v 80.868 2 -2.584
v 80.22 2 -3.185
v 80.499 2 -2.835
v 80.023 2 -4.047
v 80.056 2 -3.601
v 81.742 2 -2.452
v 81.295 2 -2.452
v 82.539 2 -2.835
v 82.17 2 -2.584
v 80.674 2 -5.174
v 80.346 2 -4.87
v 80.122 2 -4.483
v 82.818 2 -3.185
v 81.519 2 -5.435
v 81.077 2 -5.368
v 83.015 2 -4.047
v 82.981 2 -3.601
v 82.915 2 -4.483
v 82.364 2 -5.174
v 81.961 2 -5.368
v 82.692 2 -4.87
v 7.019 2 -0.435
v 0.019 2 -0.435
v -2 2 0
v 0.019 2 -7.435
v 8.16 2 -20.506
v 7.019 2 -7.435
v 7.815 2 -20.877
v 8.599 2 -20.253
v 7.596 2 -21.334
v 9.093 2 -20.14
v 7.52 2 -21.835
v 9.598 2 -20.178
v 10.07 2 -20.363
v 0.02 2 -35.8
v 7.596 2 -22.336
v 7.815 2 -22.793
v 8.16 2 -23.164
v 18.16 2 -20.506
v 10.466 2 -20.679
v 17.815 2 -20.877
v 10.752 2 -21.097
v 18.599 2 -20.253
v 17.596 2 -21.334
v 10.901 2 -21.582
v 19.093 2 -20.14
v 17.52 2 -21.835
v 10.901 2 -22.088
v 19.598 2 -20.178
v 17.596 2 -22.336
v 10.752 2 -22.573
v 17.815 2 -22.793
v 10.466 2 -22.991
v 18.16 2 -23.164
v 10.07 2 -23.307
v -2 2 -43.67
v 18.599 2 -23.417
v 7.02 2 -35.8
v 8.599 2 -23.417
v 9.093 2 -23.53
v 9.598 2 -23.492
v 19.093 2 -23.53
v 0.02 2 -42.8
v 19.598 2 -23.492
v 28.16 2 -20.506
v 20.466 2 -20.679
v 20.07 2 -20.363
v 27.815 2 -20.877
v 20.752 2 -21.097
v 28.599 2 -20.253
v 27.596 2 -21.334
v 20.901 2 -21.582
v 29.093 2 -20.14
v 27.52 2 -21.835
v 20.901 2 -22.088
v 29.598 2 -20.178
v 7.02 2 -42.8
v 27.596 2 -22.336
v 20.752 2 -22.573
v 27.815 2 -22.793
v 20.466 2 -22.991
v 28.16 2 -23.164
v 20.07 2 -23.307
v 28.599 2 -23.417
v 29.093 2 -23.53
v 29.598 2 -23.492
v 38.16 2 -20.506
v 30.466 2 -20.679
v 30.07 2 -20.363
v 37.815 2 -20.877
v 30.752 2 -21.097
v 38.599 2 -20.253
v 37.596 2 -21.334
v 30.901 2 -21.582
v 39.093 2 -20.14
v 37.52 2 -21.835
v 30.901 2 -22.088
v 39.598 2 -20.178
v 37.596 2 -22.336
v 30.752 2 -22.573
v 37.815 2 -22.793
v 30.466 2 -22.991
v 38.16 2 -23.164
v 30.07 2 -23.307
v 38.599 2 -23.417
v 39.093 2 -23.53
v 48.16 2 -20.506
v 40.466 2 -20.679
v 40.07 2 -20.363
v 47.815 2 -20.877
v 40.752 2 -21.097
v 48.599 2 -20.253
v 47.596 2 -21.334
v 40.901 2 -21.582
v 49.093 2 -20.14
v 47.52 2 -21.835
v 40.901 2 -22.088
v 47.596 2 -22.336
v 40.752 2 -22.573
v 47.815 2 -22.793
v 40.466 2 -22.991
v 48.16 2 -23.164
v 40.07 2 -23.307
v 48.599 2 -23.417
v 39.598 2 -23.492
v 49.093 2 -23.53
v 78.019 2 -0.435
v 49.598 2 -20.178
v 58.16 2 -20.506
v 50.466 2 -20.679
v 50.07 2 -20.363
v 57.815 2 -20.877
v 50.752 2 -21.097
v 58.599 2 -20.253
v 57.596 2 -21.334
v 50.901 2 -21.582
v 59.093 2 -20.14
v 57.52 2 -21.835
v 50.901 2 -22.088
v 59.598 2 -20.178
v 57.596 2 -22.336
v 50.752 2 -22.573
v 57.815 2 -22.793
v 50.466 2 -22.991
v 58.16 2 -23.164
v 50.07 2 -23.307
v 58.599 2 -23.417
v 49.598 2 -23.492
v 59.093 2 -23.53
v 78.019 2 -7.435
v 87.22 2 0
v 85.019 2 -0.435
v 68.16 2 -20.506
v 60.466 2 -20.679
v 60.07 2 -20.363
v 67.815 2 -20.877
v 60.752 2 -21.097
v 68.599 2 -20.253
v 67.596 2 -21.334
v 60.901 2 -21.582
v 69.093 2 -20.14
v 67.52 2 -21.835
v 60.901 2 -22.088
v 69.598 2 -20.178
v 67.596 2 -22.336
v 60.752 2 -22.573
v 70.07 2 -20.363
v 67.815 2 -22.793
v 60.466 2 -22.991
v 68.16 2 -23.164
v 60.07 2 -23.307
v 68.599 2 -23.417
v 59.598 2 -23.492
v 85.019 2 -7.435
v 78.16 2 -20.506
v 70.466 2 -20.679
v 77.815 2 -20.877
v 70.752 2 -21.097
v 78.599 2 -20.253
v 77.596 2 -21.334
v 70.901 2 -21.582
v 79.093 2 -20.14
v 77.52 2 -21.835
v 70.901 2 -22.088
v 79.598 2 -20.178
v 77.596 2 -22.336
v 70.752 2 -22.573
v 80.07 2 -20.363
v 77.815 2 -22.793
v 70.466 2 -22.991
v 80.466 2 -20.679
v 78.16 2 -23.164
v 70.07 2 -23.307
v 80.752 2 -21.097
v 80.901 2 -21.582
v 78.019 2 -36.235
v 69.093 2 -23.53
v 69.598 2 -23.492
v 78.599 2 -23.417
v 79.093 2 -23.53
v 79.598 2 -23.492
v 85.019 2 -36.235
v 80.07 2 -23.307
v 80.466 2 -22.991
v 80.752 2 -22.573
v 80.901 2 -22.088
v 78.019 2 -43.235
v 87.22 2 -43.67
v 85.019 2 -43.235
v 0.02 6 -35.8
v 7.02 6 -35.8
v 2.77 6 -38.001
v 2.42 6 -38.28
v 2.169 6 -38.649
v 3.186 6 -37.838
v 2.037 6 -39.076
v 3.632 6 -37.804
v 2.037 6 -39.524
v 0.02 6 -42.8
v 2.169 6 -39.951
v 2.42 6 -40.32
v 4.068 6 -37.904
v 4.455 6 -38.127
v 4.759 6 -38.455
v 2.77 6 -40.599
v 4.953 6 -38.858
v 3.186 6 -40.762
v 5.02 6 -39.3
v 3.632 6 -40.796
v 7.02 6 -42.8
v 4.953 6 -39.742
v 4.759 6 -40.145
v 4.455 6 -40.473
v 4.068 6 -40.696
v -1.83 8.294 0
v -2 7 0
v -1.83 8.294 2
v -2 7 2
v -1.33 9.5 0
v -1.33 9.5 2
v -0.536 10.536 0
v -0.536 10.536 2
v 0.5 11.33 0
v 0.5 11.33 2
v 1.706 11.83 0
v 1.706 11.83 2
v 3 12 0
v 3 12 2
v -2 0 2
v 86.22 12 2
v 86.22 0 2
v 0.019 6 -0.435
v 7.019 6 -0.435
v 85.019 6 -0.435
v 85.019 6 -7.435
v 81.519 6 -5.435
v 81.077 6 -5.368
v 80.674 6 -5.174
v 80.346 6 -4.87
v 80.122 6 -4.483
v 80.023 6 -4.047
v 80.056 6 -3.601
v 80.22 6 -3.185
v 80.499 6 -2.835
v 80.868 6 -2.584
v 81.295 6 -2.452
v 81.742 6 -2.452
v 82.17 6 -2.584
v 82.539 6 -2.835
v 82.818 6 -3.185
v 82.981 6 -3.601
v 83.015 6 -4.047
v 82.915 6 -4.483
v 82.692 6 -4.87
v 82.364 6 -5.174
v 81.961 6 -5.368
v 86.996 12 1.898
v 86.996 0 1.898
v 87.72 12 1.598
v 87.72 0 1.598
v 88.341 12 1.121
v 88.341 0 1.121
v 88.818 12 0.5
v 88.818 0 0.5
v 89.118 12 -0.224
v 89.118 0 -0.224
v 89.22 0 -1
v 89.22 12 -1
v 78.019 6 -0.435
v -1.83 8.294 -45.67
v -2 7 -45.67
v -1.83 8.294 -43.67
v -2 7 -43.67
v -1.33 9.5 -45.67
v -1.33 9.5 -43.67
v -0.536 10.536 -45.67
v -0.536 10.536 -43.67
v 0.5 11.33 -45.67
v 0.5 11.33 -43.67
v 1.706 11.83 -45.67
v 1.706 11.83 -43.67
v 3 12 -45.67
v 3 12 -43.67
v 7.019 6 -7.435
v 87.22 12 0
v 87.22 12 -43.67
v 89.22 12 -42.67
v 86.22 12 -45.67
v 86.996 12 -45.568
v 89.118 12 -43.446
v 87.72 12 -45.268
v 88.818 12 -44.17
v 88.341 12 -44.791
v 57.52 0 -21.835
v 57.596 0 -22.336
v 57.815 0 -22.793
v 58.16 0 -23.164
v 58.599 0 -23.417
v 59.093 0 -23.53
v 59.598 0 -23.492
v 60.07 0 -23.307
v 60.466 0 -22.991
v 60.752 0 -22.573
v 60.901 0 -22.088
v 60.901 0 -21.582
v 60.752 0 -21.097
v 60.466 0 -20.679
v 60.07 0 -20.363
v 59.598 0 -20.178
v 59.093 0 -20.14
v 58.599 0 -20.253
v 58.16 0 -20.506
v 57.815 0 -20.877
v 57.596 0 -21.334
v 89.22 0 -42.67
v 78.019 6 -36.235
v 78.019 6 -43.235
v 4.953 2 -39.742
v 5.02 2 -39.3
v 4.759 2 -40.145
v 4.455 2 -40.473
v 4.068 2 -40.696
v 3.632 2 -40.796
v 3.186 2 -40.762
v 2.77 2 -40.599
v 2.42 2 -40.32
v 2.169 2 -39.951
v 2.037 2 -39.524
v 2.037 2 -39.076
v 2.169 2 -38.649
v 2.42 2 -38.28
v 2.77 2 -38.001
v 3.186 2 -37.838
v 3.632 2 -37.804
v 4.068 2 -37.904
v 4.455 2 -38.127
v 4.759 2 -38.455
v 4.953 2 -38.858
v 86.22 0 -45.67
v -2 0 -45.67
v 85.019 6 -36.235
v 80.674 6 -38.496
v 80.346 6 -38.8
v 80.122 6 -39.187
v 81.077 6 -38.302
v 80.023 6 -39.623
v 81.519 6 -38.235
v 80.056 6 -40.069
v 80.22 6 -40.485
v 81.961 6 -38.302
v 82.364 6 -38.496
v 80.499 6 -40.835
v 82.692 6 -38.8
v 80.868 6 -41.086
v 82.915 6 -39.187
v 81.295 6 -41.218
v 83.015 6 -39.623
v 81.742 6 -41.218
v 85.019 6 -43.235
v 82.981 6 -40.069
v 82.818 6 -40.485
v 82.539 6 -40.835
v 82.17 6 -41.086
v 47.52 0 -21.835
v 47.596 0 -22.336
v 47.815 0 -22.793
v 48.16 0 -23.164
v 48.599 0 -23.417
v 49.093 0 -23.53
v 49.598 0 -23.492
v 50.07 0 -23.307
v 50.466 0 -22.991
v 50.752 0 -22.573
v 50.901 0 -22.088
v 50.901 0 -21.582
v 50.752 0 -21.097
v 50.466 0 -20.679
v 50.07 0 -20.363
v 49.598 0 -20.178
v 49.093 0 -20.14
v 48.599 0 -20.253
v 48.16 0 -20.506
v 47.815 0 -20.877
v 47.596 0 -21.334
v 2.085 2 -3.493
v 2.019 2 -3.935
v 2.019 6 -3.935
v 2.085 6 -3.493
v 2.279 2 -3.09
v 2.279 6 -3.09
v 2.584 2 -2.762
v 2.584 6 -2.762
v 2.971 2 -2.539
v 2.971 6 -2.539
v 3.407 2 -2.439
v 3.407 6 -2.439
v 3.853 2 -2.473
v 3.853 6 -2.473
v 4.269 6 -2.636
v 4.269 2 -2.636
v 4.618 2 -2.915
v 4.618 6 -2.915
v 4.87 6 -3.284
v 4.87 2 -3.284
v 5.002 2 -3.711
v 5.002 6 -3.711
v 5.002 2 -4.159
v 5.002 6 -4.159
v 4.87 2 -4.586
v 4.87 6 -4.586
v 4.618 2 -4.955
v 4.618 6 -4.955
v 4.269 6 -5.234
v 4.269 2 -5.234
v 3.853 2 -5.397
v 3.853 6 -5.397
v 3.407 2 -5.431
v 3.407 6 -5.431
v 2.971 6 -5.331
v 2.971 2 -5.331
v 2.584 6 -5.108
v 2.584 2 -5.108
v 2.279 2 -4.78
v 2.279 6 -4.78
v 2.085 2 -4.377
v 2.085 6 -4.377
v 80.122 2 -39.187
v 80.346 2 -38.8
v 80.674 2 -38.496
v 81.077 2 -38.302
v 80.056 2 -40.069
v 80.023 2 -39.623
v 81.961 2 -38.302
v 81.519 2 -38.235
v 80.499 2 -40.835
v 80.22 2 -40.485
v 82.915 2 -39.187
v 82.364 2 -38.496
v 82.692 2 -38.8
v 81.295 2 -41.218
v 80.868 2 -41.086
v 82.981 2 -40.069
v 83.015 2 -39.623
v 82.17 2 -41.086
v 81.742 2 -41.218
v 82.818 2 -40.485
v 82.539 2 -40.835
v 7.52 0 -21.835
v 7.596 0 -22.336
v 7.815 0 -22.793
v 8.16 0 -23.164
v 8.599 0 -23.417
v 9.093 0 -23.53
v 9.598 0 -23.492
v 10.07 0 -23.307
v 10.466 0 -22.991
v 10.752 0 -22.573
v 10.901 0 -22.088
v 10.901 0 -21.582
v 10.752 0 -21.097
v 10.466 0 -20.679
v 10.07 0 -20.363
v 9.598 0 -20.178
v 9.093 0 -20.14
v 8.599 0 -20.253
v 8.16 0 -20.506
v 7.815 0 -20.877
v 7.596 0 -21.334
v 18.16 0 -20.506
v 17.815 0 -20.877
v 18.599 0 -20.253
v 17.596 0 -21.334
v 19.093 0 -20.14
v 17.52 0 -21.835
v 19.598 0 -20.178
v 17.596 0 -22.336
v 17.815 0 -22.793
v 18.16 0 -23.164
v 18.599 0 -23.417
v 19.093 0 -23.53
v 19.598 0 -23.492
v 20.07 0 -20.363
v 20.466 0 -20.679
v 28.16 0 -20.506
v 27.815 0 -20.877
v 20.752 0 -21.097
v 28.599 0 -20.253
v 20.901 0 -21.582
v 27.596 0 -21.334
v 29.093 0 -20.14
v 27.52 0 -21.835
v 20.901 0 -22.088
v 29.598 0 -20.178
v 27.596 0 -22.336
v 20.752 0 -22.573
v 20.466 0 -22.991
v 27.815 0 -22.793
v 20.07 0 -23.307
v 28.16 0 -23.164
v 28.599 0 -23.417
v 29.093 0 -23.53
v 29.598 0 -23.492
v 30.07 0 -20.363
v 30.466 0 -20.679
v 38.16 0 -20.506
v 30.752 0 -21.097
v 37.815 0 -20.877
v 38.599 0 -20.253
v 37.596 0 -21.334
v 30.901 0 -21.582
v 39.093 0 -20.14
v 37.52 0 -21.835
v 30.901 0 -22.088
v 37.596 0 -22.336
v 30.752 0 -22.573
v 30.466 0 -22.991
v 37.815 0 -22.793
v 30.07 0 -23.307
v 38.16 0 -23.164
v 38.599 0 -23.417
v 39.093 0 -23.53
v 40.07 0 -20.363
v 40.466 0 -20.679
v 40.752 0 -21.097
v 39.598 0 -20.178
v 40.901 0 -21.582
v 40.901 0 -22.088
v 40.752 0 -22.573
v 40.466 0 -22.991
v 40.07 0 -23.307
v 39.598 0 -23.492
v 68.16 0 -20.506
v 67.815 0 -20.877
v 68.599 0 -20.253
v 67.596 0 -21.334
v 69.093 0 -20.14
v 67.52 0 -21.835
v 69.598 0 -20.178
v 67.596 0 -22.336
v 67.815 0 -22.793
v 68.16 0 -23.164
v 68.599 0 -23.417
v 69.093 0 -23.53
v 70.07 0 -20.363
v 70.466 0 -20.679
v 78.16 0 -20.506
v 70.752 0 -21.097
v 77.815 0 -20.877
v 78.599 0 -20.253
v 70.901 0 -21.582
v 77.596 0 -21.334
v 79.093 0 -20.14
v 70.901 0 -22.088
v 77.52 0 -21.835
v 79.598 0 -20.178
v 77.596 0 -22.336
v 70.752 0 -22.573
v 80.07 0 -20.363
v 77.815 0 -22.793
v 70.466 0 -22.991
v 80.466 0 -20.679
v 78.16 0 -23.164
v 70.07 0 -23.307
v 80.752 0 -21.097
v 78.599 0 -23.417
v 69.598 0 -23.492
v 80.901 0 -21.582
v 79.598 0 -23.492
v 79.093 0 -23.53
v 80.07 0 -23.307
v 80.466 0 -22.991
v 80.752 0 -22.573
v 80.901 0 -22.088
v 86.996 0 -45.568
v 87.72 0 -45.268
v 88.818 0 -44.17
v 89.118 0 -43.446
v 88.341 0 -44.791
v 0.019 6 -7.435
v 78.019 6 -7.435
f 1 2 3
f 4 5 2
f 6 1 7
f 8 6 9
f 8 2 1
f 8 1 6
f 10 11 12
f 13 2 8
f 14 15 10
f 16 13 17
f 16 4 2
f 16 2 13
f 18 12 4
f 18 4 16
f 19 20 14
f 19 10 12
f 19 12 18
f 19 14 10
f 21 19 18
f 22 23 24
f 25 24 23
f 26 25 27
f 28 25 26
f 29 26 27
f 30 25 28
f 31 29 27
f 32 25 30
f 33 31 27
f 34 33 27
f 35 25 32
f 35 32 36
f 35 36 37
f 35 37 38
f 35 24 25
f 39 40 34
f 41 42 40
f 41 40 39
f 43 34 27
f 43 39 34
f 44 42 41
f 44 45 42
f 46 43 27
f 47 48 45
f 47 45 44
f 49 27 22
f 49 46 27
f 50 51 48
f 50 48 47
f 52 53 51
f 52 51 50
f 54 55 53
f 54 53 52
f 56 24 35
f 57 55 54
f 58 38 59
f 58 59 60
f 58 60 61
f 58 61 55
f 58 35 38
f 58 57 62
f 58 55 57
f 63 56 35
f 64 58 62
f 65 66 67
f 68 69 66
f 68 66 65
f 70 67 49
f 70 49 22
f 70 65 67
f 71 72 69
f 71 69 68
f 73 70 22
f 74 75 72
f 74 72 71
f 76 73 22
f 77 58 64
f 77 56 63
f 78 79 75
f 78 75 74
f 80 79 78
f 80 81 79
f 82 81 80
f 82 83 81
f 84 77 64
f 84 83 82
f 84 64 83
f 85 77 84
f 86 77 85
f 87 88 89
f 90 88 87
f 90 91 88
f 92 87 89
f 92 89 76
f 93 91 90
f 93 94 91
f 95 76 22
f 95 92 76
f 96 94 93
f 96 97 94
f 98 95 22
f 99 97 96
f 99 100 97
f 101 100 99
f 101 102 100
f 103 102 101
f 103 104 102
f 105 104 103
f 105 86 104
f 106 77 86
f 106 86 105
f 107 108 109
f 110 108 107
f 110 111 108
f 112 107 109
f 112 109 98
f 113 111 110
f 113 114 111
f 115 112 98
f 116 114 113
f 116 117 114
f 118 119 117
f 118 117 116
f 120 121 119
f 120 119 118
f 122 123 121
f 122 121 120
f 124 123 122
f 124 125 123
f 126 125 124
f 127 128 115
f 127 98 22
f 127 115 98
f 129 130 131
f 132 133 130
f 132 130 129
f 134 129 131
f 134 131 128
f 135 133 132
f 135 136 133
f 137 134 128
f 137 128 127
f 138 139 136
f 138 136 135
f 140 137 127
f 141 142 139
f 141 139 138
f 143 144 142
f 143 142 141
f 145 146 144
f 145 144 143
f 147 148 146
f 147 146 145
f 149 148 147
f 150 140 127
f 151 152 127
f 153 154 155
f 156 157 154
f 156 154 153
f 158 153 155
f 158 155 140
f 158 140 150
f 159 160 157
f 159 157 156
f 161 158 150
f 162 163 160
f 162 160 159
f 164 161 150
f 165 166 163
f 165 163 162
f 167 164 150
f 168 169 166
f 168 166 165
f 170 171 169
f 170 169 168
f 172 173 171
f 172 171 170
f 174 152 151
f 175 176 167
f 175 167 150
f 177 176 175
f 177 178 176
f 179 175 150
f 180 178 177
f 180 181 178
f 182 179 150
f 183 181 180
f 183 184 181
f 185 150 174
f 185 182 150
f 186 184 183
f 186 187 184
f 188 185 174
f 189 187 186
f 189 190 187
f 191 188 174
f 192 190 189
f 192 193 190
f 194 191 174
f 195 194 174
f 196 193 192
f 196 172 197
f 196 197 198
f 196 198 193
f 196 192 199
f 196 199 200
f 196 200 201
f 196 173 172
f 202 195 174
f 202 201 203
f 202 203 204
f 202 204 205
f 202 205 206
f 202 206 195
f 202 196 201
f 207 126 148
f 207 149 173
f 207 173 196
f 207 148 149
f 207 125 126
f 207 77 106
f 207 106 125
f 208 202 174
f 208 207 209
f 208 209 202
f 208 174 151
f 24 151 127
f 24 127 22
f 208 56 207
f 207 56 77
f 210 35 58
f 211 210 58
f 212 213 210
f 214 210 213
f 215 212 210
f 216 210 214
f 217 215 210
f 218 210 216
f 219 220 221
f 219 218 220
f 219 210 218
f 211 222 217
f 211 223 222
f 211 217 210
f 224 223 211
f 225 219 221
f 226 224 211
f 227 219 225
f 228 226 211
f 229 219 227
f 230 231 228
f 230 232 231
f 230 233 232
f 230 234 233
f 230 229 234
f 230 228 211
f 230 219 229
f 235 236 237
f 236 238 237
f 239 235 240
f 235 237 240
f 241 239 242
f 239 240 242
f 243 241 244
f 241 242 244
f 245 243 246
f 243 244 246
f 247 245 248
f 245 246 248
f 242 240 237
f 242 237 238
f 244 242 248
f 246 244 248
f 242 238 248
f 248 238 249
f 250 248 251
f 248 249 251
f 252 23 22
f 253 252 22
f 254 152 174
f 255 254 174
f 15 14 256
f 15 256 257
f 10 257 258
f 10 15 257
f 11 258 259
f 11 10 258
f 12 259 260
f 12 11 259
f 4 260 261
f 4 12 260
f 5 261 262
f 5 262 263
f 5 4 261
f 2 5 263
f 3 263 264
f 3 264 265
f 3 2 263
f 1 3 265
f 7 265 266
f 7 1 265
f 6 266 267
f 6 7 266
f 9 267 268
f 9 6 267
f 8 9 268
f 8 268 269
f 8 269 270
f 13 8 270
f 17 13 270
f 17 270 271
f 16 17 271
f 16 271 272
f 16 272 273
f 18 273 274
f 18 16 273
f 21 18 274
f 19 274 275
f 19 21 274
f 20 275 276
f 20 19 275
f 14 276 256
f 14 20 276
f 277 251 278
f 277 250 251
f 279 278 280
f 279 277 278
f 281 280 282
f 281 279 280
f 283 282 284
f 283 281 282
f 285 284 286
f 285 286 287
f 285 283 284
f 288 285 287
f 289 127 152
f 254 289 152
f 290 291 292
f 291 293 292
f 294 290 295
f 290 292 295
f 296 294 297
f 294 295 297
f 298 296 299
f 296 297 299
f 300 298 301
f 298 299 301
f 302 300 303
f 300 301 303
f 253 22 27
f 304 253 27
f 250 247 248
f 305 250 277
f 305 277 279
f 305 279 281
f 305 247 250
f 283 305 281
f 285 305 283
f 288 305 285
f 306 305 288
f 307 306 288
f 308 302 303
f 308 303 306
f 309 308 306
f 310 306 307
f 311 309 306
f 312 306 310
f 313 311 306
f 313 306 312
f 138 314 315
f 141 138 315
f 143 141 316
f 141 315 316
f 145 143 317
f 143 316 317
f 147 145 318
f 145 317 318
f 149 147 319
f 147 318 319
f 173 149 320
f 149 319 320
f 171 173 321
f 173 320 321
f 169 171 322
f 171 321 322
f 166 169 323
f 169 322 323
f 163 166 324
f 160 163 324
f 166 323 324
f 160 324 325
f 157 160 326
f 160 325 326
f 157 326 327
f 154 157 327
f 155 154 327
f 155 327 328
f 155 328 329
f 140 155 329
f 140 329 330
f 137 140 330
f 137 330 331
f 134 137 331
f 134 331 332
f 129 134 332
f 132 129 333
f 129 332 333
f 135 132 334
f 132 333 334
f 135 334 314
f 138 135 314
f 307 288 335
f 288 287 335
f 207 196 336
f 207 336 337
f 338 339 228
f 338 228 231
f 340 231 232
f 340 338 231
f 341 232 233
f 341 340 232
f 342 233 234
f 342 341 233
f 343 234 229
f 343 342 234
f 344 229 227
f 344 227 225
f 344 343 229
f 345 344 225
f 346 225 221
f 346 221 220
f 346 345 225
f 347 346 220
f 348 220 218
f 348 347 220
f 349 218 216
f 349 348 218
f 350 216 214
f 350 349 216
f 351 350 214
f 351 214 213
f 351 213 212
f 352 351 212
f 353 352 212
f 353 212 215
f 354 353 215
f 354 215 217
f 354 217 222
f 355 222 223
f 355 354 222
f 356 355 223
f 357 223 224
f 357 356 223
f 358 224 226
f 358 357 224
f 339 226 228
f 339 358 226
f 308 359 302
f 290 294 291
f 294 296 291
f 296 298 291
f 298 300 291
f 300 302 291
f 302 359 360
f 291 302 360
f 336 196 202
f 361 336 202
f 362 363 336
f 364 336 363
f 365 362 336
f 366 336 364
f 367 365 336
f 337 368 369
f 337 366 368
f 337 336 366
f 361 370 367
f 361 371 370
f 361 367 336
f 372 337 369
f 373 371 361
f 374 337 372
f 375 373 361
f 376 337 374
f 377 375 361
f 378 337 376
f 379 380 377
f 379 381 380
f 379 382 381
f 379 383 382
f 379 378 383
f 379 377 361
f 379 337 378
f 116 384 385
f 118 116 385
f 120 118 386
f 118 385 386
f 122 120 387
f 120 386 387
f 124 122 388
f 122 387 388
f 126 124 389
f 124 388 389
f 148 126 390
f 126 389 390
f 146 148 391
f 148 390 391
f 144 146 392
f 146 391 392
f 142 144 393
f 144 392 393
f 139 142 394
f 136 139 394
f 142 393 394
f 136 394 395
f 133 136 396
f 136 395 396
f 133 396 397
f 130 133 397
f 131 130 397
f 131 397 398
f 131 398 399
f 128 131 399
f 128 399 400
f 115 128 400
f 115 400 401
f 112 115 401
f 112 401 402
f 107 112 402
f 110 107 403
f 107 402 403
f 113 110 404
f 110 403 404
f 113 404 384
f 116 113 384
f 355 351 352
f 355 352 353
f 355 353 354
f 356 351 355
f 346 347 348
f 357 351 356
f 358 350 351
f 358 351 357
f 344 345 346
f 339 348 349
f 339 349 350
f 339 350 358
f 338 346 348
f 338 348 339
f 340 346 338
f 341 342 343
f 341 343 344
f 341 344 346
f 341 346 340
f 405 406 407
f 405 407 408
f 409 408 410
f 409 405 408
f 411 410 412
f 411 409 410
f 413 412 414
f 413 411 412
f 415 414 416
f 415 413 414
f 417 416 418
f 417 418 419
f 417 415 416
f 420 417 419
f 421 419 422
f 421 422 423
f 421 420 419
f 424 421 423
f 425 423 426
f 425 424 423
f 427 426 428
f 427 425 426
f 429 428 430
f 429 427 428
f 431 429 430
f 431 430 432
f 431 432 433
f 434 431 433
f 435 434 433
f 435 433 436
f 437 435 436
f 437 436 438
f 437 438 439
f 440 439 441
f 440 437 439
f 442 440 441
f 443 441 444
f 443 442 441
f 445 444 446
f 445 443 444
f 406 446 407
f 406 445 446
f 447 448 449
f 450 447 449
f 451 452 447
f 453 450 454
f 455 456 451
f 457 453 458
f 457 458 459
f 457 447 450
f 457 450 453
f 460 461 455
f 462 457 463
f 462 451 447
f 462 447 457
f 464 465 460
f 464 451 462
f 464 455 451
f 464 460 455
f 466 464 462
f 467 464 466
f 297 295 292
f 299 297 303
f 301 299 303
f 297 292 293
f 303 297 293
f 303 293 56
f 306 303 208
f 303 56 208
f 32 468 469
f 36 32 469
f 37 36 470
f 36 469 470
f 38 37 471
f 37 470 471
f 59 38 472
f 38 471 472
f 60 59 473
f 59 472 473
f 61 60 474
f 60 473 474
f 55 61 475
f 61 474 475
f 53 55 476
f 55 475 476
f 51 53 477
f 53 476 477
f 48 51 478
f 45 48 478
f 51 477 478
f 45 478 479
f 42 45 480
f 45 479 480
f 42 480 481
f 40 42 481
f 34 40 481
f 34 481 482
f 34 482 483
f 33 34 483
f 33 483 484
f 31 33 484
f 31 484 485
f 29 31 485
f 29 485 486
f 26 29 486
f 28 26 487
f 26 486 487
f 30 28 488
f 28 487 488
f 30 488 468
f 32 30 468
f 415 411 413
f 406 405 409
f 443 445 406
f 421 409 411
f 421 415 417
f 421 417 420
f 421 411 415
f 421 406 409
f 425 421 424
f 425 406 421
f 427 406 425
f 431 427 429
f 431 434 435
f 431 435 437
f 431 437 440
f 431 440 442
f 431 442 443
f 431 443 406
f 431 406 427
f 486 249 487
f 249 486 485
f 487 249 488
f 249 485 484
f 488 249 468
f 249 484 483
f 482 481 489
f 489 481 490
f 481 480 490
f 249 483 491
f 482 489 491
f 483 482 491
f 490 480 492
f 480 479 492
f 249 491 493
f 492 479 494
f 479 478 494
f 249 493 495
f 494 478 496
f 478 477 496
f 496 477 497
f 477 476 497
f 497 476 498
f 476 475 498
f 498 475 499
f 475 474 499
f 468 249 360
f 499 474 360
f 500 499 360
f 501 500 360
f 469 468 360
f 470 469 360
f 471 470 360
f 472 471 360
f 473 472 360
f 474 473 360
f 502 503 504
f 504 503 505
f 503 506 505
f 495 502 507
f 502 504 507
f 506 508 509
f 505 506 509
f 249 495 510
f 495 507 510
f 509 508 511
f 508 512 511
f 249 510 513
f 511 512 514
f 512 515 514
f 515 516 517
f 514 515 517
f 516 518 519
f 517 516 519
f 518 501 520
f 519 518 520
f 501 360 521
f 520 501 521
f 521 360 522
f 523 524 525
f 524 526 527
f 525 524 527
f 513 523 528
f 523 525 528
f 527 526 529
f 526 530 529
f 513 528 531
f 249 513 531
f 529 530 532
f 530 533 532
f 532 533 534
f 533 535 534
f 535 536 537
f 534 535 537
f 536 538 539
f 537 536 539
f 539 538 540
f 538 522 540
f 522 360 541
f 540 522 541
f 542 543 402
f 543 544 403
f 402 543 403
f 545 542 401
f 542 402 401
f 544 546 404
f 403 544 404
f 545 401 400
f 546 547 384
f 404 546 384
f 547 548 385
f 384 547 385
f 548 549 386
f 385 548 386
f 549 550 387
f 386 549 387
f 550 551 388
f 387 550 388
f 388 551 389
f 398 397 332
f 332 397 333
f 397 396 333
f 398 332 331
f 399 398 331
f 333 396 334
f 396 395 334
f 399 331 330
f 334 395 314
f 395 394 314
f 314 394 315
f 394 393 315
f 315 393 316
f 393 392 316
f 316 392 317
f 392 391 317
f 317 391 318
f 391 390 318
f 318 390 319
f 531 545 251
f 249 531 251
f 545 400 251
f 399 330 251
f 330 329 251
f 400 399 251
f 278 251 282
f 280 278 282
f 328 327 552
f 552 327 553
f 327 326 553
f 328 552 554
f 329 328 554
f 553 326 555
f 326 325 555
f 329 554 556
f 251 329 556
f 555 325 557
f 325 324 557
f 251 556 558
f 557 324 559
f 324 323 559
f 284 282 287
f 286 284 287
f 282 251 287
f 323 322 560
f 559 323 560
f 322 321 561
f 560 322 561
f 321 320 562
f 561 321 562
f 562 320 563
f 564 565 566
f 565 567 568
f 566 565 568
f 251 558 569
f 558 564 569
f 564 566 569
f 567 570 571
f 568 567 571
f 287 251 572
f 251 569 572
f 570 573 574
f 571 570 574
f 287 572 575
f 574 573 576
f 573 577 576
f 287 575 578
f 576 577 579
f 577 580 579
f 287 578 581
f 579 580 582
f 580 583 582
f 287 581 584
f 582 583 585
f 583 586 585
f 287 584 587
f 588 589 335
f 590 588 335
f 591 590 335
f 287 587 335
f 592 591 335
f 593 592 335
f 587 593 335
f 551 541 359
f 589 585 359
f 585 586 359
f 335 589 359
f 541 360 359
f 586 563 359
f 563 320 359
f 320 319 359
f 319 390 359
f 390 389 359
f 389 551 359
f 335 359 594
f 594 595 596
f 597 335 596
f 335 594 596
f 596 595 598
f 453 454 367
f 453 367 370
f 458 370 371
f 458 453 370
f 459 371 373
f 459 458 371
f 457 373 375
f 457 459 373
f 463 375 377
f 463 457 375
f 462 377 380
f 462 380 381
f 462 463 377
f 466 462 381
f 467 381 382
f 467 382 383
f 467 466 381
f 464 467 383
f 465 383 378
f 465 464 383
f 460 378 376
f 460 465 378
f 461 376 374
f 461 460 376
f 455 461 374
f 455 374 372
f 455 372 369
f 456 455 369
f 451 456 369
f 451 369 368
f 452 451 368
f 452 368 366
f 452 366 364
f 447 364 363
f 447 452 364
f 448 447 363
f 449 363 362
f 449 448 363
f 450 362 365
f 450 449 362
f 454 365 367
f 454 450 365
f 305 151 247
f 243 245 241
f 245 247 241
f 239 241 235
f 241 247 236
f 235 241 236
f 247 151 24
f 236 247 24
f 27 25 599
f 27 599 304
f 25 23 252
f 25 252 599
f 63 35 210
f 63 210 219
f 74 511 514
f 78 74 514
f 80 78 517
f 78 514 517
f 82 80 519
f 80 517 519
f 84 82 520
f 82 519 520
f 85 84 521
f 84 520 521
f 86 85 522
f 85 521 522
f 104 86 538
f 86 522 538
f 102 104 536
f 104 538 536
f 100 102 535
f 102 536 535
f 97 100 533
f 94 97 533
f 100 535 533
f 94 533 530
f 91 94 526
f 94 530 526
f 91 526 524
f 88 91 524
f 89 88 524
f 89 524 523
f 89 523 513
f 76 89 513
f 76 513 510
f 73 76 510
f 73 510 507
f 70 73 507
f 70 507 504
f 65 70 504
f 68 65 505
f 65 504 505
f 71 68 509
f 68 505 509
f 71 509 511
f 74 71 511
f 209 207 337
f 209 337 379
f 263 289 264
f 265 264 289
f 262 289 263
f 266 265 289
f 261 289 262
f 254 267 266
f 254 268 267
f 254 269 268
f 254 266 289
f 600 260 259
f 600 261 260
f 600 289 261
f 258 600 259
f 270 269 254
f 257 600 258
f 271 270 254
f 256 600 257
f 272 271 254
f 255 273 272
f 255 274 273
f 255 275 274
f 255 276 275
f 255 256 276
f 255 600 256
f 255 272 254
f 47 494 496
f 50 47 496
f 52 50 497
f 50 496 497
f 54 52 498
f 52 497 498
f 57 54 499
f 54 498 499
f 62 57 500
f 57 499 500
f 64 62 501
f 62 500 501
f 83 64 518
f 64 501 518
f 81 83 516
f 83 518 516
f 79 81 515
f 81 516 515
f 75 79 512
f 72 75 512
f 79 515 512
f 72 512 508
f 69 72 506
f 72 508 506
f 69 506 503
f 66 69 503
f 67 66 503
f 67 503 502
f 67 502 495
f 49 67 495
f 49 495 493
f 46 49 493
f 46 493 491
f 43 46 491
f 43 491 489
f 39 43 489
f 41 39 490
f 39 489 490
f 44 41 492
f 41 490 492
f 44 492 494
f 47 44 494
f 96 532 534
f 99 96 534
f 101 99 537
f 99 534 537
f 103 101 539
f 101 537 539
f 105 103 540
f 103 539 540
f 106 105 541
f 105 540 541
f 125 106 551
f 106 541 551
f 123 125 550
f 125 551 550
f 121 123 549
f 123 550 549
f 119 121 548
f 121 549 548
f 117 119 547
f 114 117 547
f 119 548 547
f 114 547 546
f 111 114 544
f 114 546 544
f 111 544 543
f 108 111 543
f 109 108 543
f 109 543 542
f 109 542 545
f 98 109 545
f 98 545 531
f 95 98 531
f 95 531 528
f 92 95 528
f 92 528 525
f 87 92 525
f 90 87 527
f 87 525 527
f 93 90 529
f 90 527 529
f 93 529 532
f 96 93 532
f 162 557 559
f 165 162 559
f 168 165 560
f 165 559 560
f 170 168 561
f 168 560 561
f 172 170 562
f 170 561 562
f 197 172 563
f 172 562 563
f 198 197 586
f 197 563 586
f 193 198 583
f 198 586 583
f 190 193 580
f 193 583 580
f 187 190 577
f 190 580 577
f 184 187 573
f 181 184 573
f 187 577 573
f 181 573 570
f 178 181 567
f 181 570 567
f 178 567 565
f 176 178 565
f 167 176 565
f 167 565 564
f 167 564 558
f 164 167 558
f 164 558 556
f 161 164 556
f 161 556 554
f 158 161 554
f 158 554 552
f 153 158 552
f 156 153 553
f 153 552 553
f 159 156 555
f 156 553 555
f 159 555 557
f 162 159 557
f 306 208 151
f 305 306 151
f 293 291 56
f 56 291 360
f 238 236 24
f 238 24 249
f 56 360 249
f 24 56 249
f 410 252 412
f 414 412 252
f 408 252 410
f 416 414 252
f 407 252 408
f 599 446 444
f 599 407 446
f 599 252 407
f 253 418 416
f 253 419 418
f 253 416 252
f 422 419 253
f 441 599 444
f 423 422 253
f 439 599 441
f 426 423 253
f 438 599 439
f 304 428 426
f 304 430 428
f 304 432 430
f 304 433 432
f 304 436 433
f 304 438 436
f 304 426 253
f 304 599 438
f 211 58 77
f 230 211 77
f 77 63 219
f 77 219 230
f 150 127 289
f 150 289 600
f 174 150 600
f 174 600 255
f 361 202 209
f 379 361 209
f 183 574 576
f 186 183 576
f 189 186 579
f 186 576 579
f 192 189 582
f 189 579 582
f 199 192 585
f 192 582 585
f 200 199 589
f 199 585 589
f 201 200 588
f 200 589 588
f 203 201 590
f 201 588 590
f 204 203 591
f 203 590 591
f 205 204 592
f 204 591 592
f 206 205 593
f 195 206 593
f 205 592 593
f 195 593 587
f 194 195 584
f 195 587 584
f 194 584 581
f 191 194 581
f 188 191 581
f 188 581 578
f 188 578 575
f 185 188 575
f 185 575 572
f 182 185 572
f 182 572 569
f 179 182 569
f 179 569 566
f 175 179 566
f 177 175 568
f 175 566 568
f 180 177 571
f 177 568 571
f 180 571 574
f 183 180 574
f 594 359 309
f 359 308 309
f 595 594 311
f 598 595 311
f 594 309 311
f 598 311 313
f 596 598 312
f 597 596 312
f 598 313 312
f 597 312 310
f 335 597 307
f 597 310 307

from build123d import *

# Parameters (mm, degrees)
BOSS_EXTRUDE1_DEPTH = 2
BOSS_EXTRUDE2_DEPTH = 10
SKETCH3_W           = 7
SKETCH3_H           = 7
SKETCH3_R           = 1.5
BOSS_EXTRUDE3_DEPTH = 4
FILLET1_R           = 5
FILLET2_R           = 3


with BuildPart() as part:
    # Sketch1 → Boss-Extrude1 (new body)
    with BuildSketch(Plane(origin=(0, 0, 0), x_dir=(1, 0, 0), z_dir=(0, 1, 0))):
        with BuildLine():
            Line((-2, 21.835), (-2, -2))
            Line((-2, -2), (89.22, -2))
            Line((89.22, -2), (89.22, 21.835))
            Line((89.22, 21.835), (80.92, 21.835))
            ThreePointArc((80.92, 21.835), (79.22, 20.135), (77.52, 21.835))
            Line((77.52, 21.835), (70.92, 21.835))
            ThreePointArc((70.92, 21.835), (69.22, 20.135), (67.52, 21.835))
            Line((67.52, 21.835), (60.92, 21.835))
            ThreePointArc((60.92, 21.835), (59.22, 20.135), (57.52, 21.835))
            Line((57.52, 21.835), (50.92, 21.835))
            ThreePointArc((50.92, 21.835), (49.22, 20.135), (47.52, 21.835))
            Line((47.52, 21.835), (40.92, 21.835))
            ThreePointArc((40.92, 21.835), (39.22, 20.135), (37.52, 21.835))
            Line((37.52, 21.835), (30.92, 21.835))
            ThreePointArc((30.92, 21.835), (29.22, 20.135), (27.52, 21.835))
            Line((27.52, 21.835), (20.92, 21.835))
            ThreePointArc((20.92, 21.835), (19.22, 20.135), (17.52, 21.835))
            Line((17.52, 21.835), (10.92, 21.835))
            ThreePointArc((10.92, 21.835), (9.22, 20.135), (7.52, 21.835))
            Line((7.52, 21.835), (-2, 21.835))
        make_face()
        with BuildLine():
            Line((-2, 45.67), (-2, 21.835))
            Line((-2, 21.835), (7.52, 21.835))
            ThreePointArc((7.52, 21.835), (9.22, 23.535), (10.92, 21.835))
            Line((10.92, 21.835), (17.52, 21.835))
            ThreePointArc((17.52, 21.835), (19.22, 23.535), (20.92, 21.835))
            Line((20.92, 21.835), (27.52, 21.835))
            ThreePointArc((27.52, 21.835), (29.22, 23.535), (30.92, 21.835))
            Line((30.92, 21.835), (37.52, 21.835))
            ThreePointArc((37.52, 21.835), (39.22, 23.535), (40.92, 21.835))
            Line((40.92, 21.835), (47.52, 21.835))
            ThreePointArc((47.52, 21.835), (49.22, 23.535), (50.92, 21.835))
            Line((50.92, 21.835), (57.52, 21.835))
            ThreePointArc((57.52, 21.835), (59.22, 23.535), (60.92, 21.835))
            Line((60.92, 21.835), (67.52, 21.835))
            ThreePointArc((67.52, 21.835), (69.22, 23.535), (70.92, 21.835))
            Line((70.92, 21.835), (77.52, 21.835))
            ThreePointArc((77.52, 21.835), (79.22, 23.535), (80.92, 21.835))
            Line((80.92, 21.835), (89.22, 21.835))
            Line((89.22, 21.835), (89.22, 45.67))
            Line((89.22, 45.67), (-2, 45.67))
        make_face()
    extrude(amount=BOSS_EXTRUDE1_DEPTH)

    # Sketch2 → Boss-Extrude2 (add)
    with BuildSketch(Plane(origin=(0, 2, 0), x_dir=(1, 0, 0), z_dir=(0, 1, 0))):
        Polygon((-2, 0), (-2, -2), (89.22, -2), (89.22, 45.67), (-2, 45.67), (-2, 43.67), (0, 43.67), (87.22, 43.67), (87.22, 0), (0, 0), align=None)
    extrude(amount=BOSS_EXTRUDE2_DEPTH)

    # Sketch3 → Boss-Extrude3 (add)
    # profile 1 of 4: a face of its own
    with BuildSketch(Plane(origin=(0, 2, 0), x_dir=(1, 0, 0), z_dir=(0, 1, 0))):
        with Locations((81.51878701, 39.735)):
            Rectangle(SKETCH3_W, SKETCH3_H)
        with Locations(Location((81.51878701, 39.735, 0), (0, 0, 270))):
            Circle(SKETCH3_R, mode=Mode.SUBTRACT)
    # profile 2 of 4: a face of its own
    with BuildSketch(Plane(origin=(0, 2, 0), x_dir=(1, 0, 0), z_dir=(0, 1, 0))):
        with Locations((81.51878701, 3.935)):
            Rectangle(SKETCH3_W, SKETCH3_H)
        with Locations(Location((81.51878701, 3.935, 0), (0, 0, 90))):
            Circle(SKETCH3_R, mode=Mode.SUBTRACT)
    # profile 3 of 4: a face of its own
    with BuildSketch(Plane(origin=(0, 2, 0), x_dir=(1, 0, 0), z_dir=(0, 1, 0))):
        with Locations((3.52, 39.3)):
            Rectangle(SKETCH3_W, SKETCH3_H)
        with Locations((3.52, 39.3)):
            Circle(SKETCH3_R, mode=Mode.SUBTRACT)
    # profile 4 of 4: a face of its own
    with BuildSketch(Plane(origin=(0, 2, 0), x_dir=(1, 0, 0), z_dir=(0, 1, 0))):
        with Locations((3.51878701, 3.935)):
            Rectangle(SKETCH3_W, SKETCH3_H)
        with Locations(Location((3.51878701, 3.935, 0), (0, 0, 180))):
            Circle(SKETCH3_R, mode=Mode.SUBTRACT)
    extrude(amount=BOSS_EXTRUDE3_DEPTH)

    # Fillet1
    fillet1_edges = [part.edges().sort_by_distance(p)[0] for p in [
        (-2, 12, -44.67),
        (-2, 12, 1),
    ]]
    fillet(fillet1_edges, radius=FILLET1_R)

    # Fillet2
    fillet2_edges = [part.edges().sort_by_distance(p)[0] for p in [
        (89.22, 6, -45.67),
        (89.22, 6, 2),
    ]]
    fillet(fillet2_edges, radius=FILLET2_R)


solid = part.part
